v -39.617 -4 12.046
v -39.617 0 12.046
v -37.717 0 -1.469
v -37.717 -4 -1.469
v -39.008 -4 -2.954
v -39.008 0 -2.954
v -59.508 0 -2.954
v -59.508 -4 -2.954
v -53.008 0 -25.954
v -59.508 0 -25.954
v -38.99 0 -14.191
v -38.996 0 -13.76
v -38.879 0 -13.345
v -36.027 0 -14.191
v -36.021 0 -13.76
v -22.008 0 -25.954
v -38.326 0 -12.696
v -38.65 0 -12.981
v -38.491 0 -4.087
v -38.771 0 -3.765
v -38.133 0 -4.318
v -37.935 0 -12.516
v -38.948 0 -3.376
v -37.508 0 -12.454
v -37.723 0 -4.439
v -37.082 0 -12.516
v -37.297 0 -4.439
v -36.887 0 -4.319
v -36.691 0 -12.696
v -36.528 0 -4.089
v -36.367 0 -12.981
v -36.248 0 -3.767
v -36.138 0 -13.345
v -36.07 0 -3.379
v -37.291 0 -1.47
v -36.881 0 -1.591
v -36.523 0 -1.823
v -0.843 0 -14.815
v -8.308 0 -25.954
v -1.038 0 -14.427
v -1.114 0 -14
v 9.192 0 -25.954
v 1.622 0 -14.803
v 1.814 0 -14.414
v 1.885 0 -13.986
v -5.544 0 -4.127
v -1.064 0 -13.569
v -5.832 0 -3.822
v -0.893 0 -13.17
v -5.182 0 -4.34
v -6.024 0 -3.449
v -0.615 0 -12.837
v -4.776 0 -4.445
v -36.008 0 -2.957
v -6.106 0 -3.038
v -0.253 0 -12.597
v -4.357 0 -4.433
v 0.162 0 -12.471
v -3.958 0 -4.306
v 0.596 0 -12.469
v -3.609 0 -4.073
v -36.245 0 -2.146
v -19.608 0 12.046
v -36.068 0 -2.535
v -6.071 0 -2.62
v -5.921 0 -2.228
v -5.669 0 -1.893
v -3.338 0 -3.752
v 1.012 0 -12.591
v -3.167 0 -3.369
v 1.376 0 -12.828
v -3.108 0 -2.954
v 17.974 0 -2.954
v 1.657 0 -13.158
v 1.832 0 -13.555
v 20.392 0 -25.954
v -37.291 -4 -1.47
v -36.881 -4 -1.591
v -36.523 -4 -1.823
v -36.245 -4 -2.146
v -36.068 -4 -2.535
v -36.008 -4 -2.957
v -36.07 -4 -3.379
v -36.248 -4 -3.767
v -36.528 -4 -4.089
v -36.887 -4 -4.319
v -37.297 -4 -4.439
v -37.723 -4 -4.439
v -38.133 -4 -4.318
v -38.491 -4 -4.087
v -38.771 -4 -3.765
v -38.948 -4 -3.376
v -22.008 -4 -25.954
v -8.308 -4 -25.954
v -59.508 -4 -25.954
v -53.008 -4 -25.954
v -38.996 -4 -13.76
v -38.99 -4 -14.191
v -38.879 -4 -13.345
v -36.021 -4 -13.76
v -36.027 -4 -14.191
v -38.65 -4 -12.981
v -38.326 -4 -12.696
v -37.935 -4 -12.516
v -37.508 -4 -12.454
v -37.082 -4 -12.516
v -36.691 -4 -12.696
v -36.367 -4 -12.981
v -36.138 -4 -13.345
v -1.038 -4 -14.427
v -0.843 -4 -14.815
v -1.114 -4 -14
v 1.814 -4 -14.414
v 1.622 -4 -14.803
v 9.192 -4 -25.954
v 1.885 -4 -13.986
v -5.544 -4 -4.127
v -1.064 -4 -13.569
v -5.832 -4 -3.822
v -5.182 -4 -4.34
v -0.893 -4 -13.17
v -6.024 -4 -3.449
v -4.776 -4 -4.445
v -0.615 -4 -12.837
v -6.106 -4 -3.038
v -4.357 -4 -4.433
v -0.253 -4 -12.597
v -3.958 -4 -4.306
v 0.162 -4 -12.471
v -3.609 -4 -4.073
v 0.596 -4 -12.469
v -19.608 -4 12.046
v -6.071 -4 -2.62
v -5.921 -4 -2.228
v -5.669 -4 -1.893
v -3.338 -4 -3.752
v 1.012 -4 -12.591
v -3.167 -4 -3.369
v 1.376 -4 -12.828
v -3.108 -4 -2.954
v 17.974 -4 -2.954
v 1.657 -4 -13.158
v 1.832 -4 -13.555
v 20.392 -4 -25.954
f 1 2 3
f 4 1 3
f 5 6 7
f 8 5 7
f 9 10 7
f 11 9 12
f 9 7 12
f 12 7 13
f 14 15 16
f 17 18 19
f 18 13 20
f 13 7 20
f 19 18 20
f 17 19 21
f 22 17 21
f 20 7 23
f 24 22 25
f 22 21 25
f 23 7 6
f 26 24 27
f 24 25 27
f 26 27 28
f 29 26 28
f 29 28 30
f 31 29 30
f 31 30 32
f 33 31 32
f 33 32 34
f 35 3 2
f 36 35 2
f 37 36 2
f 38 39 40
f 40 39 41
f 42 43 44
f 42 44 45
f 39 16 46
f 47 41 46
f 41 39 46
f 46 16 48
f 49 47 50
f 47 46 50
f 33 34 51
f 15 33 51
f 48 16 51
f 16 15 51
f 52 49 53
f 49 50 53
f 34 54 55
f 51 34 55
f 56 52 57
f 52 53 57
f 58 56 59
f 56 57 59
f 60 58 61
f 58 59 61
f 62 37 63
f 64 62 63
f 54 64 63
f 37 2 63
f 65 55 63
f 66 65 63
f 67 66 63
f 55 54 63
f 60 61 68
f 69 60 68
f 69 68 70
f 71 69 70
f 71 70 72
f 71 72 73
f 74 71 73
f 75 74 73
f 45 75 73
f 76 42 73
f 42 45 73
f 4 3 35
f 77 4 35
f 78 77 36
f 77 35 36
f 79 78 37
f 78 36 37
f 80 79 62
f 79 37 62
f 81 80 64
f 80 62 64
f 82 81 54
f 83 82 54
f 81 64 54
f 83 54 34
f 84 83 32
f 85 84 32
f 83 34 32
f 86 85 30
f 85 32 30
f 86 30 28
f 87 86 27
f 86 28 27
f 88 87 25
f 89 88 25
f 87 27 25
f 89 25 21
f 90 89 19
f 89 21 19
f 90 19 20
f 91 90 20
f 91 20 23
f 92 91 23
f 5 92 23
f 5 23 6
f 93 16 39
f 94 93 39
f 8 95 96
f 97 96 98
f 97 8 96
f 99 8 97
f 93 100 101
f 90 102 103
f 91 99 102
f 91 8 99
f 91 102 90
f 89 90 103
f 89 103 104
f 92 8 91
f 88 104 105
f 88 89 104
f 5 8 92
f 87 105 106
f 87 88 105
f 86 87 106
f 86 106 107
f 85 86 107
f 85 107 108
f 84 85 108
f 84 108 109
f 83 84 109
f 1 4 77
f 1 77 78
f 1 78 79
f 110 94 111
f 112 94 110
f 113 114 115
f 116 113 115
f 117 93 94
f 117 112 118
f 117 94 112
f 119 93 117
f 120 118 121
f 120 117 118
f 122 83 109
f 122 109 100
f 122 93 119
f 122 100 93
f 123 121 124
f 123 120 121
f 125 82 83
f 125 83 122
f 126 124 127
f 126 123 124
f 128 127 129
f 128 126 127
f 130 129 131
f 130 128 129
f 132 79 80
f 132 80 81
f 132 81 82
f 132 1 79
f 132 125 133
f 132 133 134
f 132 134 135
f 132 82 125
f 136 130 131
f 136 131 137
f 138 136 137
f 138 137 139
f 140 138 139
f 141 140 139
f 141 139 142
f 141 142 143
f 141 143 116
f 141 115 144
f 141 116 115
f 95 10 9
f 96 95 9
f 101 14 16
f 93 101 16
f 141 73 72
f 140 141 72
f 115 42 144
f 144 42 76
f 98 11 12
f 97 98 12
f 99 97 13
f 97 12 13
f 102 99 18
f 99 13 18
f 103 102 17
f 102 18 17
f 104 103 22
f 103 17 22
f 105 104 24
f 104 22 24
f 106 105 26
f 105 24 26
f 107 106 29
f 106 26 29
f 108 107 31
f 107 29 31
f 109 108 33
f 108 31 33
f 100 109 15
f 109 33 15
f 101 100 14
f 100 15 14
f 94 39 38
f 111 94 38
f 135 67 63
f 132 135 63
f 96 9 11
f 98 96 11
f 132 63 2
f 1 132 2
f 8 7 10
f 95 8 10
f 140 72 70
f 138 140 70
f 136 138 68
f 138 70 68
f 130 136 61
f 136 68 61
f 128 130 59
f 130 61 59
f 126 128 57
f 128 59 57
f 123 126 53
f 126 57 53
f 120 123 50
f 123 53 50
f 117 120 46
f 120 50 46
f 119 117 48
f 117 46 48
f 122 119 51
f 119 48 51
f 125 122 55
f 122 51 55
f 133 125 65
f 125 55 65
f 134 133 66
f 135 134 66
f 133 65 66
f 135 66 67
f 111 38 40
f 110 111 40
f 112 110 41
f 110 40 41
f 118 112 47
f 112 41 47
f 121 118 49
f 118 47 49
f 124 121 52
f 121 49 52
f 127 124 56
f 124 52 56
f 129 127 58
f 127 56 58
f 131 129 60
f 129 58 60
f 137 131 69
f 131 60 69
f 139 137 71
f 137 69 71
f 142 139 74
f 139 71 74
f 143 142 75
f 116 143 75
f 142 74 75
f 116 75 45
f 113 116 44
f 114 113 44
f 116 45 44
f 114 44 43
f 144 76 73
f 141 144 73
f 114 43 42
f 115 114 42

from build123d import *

# Parameters (mm, degrees)
F1_DEPTH = 4


with BuildPart() as f1:
    # F0 (on Front) → F1 (new body)
    with BuildSketch(Plane.XZ):
        with BuildLine():
            Line((-19.608427, 12.045941), (-39.61654, 12.045941))
            Line((-39.61654, 12.045941), (-37.717187, -1.468657))
            ThreePointArc((-37.717187, -1.468657), (-36.376363, -3.938148), (-39.008427, -2.954059))
            Line((-39.008427, -2.954059), (-59.508427, -2.954059))
            Line((-59.508427, -2.954059), (-59.508427, -25.954059))
            Line((-59.508427, -25.954059), (-53.008427, -25.954059))
            Line((-53.008427, -25.954059), (-38.989615, -14.190879))
            ThreePointArc((-38.989615, -14.190879), (-37.508427, -12.454059), (-36.02724, -14.190879))
            Line((-36.02724, -14.190879), (-22.008427, -25.954059))
            Line((-22.008427, -25.954059), (-8.308427, -25.954059))
            Line((-8.308427, -25.954059), (-0.842829, -14.814868))
            ThreePointArc((-0.842829, -14.814868), (0.378701, -12.454237), (1.622211, -14.803363))
            Line((1.622211, -14.803363), (9.191573, -25.954059))
            Line((9.191573, -25.954059), (20.391573, -25.954059))
            Line((20.391573, -25.954059), (17.974175, -2.954059))
            Line((17.974175, -2.954059), (-3.108427, -2.954059))
            ThreePointArc((-3.108427, -2.954059), (-5.182452, -4.339879), (-5.669087, -1.893399))
            Line((-5.669087, -1.893399), (-19.608427, 12.045941))
        make_face()
    extrude(amount=F1_DEPTH)


solid = f1.part
